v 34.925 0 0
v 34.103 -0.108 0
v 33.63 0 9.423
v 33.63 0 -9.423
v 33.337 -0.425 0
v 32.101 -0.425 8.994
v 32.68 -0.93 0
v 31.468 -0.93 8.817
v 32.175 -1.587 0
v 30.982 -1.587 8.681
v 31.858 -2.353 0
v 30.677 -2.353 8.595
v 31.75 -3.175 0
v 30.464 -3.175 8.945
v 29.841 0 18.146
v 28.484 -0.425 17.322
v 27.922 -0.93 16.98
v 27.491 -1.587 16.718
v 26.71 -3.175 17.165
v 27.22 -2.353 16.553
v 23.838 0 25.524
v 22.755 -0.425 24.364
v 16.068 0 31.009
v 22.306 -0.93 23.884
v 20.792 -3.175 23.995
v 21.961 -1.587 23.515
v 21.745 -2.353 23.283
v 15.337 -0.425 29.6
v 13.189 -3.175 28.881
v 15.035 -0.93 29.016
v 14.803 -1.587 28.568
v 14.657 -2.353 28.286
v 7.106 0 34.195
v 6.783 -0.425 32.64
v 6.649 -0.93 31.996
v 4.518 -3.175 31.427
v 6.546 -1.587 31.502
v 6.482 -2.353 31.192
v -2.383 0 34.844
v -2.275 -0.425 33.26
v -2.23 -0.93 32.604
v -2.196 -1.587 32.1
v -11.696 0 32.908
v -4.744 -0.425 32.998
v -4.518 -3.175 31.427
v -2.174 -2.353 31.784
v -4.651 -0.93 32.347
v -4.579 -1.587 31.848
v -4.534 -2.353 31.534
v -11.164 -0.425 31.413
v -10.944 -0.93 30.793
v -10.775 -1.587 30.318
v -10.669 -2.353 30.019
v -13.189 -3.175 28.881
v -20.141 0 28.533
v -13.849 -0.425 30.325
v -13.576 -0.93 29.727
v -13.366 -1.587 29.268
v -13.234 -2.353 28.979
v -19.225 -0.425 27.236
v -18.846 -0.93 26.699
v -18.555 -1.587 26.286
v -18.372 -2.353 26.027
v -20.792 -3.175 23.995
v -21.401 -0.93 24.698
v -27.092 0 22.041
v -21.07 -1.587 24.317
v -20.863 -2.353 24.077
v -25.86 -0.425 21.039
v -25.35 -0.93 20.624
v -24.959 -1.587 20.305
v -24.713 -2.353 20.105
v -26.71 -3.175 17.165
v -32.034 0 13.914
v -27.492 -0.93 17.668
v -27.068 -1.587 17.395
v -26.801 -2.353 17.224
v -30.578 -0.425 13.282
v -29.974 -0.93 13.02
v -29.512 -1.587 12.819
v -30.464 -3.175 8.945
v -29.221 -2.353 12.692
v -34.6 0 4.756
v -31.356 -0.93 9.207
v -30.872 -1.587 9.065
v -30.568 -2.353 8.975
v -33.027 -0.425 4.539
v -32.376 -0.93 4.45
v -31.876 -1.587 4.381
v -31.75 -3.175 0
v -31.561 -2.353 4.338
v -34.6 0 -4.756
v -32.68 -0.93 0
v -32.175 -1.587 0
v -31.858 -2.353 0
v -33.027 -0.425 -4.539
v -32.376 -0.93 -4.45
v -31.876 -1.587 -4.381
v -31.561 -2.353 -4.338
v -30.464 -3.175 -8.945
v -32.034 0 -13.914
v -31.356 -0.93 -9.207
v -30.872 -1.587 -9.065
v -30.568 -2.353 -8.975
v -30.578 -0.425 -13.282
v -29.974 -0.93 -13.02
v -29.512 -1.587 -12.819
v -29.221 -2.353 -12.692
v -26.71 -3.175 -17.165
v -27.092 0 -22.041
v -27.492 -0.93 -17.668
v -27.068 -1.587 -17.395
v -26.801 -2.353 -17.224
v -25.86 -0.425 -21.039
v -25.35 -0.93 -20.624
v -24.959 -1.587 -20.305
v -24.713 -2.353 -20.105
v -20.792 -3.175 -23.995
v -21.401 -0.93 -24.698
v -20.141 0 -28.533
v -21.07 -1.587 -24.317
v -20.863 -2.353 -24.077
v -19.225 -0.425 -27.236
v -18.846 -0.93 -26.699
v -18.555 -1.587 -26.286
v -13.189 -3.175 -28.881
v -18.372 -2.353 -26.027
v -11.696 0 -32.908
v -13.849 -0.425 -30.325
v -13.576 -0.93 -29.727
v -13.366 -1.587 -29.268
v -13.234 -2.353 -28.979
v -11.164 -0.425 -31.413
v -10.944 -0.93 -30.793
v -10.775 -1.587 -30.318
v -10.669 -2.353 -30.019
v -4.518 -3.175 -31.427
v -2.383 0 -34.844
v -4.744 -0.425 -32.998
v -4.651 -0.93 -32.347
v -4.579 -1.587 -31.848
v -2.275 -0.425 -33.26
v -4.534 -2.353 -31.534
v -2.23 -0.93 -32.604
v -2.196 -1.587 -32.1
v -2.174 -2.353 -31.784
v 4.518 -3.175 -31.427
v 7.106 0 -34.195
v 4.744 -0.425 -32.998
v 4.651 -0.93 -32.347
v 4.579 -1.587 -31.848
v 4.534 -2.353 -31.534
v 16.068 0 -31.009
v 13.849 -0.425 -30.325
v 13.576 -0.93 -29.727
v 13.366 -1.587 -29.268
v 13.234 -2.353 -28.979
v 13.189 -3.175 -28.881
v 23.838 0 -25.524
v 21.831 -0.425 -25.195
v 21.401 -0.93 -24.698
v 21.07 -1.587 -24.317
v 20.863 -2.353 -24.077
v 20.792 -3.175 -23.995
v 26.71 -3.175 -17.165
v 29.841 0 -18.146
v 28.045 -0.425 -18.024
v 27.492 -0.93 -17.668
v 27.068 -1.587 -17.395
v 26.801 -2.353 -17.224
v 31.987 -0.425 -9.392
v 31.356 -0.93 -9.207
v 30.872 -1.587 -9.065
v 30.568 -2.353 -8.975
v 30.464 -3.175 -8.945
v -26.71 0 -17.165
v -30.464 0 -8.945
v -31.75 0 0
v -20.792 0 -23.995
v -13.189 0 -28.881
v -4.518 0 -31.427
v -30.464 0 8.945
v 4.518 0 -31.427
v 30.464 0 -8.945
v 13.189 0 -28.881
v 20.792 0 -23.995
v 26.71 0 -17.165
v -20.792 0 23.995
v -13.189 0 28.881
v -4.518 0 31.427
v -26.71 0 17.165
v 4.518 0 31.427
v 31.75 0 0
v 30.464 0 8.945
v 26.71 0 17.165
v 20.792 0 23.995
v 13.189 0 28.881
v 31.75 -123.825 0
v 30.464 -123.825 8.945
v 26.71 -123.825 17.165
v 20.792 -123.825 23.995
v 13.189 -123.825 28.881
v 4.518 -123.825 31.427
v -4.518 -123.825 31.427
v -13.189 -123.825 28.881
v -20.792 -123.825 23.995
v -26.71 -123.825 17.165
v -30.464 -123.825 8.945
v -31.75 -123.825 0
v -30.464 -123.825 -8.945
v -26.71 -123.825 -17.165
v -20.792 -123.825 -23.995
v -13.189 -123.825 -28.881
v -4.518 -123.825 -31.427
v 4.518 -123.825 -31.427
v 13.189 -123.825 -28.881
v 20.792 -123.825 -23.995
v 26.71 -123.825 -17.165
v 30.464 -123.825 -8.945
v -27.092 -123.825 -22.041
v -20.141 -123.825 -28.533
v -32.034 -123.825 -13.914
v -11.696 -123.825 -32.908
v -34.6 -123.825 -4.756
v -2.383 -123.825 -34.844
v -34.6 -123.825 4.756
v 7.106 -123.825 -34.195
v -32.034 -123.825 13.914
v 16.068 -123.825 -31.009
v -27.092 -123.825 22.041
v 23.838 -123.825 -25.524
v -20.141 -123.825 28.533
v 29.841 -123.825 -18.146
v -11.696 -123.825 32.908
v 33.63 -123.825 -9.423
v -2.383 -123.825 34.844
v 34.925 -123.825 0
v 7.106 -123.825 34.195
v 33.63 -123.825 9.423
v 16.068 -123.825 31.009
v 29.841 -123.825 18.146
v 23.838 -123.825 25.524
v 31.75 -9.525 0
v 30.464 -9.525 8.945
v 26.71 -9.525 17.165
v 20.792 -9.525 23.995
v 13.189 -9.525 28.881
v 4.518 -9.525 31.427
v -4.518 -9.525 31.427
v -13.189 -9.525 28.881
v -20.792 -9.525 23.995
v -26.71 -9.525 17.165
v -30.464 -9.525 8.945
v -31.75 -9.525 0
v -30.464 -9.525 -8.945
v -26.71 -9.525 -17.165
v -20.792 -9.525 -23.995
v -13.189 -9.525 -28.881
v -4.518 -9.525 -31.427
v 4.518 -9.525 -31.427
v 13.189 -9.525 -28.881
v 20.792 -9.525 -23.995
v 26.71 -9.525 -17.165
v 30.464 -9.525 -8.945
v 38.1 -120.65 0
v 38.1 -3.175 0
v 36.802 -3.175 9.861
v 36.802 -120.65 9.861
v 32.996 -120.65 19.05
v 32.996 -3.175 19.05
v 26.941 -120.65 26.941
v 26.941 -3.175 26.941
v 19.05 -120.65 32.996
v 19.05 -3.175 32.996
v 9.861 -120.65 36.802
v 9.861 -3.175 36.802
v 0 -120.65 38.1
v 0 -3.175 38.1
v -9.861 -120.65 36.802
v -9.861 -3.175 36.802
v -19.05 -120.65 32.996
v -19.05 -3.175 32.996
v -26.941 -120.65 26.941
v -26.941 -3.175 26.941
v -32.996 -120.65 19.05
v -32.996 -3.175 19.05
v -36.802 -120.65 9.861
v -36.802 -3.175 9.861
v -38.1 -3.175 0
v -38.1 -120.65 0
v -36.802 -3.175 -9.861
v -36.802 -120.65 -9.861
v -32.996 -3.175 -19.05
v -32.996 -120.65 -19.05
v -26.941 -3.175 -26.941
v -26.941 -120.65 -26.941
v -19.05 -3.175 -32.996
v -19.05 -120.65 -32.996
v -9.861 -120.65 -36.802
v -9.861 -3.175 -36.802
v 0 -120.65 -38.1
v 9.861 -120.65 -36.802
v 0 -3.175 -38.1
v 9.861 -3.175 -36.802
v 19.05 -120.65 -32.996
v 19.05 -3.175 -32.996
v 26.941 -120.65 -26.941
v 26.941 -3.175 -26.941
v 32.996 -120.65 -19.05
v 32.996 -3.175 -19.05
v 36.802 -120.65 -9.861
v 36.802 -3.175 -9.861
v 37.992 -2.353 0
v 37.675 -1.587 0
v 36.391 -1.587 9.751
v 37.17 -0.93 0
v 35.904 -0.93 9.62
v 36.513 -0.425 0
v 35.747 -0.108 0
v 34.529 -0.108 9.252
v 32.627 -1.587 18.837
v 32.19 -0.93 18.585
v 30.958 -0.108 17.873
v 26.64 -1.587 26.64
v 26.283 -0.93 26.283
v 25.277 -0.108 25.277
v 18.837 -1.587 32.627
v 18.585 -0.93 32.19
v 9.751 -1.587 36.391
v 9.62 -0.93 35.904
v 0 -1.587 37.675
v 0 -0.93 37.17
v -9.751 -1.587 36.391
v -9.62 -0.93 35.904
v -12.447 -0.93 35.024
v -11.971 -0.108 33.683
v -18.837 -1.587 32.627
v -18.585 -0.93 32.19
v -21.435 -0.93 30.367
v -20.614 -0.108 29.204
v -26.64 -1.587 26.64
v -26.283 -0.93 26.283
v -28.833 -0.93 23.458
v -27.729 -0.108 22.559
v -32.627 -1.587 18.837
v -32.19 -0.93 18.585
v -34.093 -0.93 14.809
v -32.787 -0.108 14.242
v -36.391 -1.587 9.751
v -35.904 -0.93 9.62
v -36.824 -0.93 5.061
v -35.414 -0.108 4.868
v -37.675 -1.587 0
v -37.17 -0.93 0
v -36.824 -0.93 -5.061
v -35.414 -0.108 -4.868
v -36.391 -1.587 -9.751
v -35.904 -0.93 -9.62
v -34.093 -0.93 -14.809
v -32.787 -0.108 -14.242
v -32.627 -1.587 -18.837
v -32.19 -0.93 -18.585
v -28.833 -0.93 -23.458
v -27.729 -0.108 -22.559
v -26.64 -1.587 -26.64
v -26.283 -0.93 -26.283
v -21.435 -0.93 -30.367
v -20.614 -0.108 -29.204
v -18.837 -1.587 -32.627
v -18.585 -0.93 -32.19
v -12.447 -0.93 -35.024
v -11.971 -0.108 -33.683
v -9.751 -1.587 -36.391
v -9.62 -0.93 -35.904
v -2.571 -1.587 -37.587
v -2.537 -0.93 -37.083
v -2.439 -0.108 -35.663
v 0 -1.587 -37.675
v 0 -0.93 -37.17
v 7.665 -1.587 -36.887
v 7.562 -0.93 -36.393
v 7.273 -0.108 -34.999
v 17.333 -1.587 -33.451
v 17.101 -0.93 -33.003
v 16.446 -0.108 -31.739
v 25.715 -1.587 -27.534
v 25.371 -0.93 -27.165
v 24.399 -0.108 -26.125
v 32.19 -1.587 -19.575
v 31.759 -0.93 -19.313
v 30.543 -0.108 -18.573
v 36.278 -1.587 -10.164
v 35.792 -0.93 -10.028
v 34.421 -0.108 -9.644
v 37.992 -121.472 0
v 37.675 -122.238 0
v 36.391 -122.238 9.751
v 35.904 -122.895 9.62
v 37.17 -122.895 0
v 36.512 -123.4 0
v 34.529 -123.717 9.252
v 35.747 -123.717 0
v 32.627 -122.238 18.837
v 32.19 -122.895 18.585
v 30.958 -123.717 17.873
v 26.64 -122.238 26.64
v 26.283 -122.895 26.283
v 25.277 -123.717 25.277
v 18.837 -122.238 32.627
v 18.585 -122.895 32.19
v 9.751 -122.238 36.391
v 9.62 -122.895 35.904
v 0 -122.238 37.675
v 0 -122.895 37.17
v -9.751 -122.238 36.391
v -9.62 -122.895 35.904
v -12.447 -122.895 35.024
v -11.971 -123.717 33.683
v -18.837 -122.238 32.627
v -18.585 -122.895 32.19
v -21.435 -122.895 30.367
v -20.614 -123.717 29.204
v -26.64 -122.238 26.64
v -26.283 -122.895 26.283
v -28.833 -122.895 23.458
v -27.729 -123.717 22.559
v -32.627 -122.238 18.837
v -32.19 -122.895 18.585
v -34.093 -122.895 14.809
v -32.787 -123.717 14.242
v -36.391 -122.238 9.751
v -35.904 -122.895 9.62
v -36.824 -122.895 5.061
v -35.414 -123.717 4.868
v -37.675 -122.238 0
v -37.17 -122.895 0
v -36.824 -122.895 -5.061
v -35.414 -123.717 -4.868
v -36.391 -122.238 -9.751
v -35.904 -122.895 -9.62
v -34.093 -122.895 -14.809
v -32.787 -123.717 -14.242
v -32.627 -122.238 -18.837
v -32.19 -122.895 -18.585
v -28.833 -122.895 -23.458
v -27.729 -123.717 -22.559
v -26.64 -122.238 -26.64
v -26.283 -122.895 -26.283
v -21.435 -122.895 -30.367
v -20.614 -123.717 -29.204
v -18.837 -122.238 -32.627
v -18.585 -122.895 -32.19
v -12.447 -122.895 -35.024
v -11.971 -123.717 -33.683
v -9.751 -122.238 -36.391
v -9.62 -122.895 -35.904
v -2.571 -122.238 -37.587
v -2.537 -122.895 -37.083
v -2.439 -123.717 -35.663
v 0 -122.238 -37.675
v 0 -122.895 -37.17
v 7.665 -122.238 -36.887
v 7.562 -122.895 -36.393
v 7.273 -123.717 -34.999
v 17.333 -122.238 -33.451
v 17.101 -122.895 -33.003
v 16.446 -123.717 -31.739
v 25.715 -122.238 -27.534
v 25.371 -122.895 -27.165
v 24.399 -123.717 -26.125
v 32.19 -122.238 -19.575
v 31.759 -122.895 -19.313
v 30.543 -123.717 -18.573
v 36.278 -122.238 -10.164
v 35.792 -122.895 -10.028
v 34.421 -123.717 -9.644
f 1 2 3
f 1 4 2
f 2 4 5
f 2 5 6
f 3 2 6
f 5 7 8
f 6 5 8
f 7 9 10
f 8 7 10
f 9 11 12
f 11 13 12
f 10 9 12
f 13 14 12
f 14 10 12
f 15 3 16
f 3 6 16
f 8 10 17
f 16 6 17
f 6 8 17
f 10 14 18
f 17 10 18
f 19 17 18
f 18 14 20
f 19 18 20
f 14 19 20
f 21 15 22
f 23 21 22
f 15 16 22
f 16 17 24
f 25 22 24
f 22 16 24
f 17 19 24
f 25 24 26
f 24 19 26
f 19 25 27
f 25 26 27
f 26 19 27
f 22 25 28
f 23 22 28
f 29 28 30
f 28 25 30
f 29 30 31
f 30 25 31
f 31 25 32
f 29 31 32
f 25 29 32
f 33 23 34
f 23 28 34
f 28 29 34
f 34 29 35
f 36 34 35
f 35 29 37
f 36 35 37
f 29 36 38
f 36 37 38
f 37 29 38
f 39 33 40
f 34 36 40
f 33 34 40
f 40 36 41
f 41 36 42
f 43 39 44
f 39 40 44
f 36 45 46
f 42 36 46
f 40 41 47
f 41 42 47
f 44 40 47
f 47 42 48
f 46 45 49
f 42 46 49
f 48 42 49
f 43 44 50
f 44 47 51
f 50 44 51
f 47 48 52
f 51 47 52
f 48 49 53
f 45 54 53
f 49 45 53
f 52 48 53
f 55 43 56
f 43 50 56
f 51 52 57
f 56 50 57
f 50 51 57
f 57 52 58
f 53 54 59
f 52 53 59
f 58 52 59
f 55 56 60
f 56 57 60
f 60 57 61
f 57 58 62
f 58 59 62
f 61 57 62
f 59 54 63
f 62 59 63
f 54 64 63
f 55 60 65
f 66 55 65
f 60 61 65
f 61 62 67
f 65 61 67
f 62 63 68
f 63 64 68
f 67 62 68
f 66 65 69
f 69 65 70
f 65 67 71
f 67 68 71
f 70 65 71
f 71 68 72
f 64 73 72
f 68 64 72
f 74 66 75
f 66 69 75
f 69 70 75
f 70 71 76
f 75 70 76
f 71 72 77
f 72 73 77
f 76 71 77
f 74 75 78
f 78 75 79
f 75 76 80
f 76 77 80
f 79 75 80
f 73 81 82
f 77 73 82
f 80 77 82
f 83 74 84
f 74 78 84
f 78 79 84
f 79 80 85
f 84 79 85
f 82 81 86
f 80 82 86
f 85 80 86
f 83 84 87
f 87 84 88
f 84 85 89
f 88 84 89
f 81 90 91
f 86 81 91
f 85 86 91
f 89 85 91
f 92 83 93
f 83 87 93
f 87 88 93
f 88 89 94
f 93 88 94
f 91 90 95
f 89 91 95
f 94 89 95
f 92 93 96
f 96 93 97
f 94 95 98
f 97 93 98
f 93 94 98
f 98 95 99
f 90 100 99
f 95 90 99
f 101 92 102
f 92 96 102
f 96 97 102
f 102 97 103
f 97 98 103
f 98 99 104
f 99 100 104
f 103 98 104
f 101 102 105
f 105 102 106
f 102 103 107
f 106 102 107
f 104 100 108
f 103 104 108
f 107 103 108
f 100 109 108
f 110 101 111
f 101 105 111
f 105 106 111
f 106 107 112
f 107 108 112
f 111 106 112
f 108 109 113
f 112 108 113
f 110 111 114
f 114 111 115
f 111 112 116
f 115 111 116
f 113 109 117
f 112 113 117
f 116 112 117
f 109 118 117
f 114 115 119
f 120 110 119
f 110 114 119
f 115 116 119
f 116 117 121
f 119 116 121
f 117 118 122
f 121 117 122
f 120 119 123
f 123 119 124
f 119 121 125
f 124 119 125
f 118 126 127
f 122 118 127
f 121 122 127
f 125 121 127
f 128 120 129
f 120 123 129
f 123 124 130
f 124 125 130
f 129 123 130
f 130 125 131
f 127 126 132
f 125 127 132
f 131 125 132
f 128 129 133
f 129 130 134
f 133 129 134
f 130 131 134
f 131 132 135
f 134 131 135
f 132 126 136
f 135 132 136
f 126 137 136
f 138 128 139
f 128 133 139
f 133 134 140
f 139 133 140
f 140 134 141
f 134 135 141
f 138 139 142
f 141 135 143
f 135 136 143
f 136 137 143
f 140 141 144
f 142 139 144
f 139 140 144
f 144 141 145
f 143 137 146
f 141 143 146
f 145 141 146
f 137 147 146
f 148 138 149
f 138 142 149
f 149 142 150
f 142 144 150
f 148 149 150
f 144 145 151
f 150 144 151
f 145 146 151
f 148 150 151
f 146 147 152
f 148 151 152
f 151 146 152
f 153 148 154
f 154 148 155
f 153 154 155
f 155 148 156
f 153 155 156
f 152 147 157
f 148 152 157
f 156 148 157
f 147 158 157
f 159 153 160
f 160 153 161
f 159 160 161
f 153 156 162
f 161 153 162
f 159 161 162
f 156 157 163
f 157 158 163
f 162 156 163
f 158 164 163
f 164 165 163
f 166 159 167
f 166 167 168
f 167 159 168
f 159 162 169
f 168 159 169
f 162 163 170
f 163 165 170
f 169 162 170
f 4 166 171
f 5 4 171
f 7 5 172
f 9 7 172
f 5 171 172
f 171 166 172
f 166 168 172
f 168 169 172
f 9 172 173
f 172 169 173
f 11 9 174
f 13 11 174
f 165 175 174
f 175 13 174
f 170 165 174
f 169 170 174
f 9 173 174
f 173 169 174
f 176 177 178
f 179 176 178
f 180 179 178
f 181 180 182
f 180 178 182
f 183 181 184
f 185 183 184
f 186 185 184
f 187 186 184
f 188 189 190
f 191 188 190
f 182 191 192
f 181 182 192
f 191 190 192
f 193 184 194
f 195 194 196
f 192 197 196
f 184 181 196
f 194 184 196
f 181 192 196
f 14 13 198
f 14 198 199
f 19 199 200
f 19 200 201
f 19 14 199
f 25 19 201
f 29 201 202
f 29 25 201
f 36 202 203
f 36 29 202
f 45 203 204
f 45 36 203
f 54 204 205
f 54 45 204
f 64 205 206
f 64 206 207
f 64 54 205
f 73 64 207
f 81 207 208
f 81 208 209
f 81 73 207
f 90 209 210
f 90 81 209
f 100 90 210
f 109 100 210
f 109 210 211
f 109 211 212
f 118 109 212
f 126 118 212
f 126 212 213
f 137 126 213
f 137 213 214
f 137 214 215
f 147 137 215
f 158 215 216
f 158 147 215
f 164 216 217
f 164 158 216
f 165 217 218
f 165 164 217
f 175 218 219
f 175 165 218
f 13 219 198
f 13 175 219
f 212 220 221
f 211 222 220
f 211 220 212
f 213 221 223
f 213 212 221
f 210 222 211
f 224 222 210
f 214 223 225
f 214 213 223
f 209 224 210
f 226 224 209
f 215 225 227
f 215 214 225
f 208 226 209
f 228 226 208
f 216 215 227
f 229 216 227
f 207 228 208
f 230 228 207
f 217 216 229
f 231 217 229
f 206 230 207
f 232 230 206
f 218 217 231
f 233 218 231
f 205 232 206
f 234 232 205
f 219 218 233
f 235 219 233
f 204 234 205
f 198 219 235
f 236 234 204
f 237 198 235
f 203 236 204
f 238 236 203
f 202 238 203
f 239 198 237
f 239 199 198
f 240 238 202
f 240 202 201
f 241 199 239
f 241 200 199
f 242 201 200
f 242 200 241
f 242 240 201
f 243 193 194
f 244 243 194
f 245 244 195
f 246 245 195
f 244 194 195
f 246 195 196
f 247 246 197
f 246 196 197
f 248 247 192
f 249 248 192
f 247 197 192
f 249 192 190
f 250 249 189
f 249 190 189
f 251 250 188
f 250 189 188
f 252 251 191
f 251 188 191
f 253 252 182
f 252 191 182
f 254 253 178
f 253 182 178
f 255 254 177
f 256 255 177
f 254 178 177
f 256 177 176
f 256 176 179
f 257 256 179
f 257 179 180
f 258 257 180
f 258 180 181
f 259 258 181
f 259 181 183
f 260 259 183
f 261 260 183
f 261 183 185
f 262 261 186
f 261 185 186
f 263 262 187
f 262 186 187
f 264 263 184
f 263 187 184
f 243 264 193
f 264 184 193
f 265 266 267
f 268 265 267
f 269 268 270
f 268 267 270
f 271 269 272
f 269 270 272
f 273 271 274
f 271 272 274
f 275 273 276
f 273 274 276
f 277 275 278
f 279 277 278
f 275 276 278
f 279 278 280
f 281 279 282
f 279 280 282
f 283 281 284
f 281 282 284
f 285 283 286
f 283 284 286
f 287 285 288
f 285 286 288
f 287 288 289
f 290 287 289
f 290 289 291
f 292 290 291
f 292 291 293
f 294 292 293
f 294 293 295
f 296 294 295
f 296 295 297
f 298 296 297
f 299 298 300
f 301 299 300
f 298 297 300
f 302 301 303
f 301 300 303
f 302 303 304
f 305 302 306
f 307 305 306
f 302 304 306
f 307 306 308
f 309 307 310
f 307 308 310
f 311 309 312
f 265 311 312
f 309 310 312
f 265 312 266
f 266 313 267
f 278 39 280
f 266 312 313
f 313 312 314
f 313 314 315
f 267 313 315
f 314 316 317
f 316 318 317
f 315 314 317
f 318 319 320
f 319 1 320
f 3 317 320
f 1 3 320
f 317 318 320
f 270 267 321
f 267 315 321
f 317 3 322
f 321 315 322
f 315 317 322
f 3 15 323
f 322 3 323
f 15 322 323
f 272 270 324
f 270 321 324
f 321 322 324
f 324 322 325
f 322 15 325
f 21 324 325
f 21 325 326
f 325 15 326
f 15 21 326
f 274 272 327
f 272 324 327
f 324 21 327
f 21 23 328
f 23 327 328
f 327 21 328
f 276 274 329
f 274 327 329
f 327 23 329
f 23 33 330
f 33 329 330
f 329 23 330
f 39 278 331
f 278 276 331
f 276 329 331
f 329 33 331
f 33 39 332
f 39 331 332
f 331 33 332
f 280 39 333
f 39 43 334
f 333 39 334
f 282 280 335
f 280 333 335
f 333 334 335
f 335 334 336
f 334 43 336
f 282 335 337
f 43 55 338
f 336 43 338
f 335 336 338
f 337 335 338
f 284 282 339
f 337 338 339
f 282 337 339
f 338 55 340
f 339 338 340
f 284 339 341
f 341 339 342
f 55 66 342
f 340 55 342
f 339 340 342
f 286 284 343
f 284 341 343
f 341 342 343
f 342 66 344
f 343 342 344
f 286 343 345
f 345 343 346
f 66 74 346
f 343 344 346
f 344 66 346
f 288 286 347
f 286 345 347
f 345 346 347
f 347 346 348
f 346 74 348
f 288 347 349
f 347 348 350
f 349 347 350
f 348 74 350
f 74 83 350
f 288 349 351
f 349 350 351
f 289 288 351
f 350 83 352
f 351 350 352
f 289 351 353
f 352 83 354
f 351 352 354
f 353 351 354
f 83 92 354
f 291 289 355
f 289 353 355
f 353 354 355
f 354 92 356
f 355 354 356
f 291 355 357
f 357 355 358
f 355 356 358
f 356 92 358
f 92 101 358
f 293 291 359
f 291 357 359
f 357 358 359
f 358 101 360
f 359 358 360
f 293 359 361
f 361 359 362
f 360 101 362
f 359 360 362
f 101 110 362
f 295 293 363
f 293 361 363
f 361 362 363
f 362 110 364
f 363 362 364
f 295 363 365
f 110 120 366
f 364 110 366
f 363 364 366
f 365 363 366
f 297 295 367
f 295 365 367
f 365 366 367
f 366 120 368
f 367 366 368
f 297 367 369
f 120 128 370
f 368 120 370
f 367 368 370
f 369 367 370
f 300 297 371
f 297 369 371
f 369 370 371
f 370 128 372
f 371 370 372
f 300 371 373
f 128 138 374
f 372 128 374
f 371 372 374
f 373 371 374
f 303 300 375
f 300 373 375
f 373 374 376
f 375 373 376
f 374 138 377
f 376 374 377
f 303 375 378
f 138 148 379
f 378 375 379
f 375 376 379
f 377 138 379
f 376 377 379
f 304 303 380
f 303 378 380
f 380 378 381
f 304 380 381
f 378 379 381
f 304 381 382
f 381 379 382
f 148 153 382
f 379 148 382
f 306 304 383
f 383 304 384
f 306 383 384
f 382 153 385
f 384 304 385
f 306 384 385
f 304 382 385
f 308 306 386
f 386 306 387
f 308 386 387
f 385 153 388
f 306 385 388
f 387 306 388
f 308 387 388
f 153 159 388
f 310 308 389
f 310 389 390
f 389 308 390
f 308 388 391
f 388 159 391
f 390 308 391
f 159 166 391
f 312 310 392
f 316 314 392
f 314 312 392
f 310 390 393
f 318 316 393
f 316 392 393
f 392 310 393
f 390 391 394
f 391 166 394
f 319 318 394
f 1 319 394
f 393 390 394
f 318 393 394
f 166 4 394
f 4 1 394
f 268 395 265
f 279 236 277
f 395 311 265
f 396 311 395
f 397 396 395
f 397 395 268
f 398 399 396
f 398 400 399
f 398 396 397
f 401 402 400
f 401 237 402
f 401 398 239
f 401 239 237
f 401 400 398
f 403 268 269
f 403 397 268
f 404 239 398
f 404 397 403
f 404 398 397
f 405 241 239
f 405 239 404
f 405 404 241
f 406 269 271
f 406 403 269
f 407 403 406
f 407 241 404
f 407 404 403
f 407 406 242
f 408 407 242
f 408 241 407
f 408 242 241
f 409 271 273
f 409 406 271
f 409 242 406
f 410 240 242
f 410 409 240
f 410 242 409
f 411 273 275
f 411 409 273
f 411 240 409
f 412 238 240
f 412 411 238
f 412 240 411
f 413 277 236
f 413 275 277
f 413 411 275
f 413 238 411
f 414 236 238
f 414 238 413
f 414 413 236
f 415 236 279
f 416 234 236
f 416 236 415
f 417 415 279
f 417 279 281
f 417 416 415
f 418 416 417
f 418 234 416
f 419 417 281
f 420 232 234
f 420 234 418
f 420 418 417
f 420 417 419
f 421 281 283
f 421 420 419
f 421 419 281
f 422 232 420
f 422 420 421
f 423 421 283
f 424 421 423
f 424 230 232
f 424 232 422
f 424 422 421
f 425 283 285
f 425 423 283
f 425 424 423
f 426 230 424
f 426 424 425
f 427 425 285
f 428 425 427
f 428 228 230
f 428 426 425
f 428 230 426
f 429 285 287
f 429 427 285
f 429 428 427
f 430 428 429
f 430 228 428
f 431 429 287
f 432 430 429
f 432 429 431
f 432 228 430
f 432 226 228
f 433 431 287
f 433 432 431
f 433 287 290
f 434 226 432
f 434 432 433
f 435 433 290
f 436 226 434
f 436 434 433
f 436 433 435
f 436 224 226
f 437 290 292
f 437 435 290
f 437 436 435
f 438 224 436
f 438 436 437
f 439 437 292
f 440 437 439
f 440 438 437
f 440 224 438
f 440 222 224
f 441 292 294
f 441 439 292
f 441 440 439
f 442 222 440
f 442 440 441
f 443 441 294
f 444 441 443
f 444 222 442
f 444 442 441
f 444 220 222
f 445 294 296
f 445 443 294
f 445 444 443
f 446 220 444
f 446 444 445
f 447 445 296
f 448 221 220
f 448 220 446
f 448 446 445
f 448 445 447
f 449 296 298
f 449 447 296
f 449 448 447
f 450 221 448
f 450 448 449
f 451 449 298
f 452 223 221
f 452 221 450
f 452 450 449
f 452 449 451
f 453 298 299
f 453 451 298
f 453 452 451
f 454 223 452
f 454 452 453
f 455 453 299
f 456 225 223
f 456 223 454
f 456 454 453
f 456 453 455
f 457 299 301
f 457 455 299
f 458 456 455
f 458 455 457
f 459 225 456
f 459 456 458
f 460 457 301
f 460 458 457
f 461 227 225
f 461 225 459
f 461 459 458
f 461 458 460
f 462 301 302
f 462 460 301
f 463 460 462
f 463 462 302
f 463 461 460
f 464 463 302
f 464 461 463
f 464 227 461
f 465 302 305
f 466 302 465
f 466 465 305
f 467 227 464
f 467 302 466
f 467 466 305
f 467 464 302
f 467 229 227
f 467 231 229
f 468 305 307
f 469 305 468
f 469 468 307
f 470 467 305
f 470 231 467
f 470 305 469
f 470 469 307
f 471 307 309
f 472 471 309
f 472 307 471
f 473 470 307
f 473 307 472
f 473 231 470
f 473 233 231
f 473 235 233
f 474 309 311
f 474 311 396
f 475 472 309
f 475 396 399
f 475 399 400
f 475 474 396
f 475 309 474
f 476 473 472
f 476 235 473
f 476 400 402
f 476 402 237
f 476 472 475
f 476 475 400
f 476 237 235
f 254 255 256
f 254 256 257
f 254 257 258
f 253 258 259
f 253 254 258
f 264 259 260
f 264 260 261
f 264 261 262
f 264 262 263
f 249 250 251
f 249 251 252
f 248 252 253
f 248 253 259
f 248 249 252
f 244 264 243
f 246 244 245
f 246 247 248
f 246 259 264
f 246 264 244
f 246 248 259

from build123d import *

# Parameters (mm, degrees)
F0_R     = 38.1
F0_R_2   = 31.75
F1_DEPTH = 123.825
F2_R     = 3.175
F3_R     = 3.17499
F4_DEPTH = 9.525


# Not quite as in the source:
# - a fillet or chamfer is up to 0.001 mm smaller than in the source, because OpenCascade refuses the exact size


with BuildPart() as f1:
    # F0 (on Front) → F1 (new body)
    with BuildSketch(Plane.XZ):
        Circle(F0_R)
        Circle(F0_R_2, mode=Mode.SUBTRACT)
    extrude(amount=F1_DEPTH)

    # F2
    f2_edges = [f1.edges().sort_by_distance(p)[0] for p in [
        (-38.1, -123.825, 0),
    ]]
    fillet(f2_edges, radius=F2_R)

    # F3 (radius 3.175 in the source; OpenCascade refuses exactly that, so slightly less here)
    f3_edges = [f1.edges().sort_by_distance(p)[0] for p in [
        (-38.1, 0, 0),
        (-31.75, 0, 0),
    ]]
    fillet(f3_edges, radius=F3_R)


with BuildPart() as f4:
    # F0 (on Front) → F4 (new body)
    with BuildSketch(Plane.XZ):
        Circle(F0_R_2)
    extrude(amount=F4_DEPTH)


solid = Compound([f1.part, f4.part])
